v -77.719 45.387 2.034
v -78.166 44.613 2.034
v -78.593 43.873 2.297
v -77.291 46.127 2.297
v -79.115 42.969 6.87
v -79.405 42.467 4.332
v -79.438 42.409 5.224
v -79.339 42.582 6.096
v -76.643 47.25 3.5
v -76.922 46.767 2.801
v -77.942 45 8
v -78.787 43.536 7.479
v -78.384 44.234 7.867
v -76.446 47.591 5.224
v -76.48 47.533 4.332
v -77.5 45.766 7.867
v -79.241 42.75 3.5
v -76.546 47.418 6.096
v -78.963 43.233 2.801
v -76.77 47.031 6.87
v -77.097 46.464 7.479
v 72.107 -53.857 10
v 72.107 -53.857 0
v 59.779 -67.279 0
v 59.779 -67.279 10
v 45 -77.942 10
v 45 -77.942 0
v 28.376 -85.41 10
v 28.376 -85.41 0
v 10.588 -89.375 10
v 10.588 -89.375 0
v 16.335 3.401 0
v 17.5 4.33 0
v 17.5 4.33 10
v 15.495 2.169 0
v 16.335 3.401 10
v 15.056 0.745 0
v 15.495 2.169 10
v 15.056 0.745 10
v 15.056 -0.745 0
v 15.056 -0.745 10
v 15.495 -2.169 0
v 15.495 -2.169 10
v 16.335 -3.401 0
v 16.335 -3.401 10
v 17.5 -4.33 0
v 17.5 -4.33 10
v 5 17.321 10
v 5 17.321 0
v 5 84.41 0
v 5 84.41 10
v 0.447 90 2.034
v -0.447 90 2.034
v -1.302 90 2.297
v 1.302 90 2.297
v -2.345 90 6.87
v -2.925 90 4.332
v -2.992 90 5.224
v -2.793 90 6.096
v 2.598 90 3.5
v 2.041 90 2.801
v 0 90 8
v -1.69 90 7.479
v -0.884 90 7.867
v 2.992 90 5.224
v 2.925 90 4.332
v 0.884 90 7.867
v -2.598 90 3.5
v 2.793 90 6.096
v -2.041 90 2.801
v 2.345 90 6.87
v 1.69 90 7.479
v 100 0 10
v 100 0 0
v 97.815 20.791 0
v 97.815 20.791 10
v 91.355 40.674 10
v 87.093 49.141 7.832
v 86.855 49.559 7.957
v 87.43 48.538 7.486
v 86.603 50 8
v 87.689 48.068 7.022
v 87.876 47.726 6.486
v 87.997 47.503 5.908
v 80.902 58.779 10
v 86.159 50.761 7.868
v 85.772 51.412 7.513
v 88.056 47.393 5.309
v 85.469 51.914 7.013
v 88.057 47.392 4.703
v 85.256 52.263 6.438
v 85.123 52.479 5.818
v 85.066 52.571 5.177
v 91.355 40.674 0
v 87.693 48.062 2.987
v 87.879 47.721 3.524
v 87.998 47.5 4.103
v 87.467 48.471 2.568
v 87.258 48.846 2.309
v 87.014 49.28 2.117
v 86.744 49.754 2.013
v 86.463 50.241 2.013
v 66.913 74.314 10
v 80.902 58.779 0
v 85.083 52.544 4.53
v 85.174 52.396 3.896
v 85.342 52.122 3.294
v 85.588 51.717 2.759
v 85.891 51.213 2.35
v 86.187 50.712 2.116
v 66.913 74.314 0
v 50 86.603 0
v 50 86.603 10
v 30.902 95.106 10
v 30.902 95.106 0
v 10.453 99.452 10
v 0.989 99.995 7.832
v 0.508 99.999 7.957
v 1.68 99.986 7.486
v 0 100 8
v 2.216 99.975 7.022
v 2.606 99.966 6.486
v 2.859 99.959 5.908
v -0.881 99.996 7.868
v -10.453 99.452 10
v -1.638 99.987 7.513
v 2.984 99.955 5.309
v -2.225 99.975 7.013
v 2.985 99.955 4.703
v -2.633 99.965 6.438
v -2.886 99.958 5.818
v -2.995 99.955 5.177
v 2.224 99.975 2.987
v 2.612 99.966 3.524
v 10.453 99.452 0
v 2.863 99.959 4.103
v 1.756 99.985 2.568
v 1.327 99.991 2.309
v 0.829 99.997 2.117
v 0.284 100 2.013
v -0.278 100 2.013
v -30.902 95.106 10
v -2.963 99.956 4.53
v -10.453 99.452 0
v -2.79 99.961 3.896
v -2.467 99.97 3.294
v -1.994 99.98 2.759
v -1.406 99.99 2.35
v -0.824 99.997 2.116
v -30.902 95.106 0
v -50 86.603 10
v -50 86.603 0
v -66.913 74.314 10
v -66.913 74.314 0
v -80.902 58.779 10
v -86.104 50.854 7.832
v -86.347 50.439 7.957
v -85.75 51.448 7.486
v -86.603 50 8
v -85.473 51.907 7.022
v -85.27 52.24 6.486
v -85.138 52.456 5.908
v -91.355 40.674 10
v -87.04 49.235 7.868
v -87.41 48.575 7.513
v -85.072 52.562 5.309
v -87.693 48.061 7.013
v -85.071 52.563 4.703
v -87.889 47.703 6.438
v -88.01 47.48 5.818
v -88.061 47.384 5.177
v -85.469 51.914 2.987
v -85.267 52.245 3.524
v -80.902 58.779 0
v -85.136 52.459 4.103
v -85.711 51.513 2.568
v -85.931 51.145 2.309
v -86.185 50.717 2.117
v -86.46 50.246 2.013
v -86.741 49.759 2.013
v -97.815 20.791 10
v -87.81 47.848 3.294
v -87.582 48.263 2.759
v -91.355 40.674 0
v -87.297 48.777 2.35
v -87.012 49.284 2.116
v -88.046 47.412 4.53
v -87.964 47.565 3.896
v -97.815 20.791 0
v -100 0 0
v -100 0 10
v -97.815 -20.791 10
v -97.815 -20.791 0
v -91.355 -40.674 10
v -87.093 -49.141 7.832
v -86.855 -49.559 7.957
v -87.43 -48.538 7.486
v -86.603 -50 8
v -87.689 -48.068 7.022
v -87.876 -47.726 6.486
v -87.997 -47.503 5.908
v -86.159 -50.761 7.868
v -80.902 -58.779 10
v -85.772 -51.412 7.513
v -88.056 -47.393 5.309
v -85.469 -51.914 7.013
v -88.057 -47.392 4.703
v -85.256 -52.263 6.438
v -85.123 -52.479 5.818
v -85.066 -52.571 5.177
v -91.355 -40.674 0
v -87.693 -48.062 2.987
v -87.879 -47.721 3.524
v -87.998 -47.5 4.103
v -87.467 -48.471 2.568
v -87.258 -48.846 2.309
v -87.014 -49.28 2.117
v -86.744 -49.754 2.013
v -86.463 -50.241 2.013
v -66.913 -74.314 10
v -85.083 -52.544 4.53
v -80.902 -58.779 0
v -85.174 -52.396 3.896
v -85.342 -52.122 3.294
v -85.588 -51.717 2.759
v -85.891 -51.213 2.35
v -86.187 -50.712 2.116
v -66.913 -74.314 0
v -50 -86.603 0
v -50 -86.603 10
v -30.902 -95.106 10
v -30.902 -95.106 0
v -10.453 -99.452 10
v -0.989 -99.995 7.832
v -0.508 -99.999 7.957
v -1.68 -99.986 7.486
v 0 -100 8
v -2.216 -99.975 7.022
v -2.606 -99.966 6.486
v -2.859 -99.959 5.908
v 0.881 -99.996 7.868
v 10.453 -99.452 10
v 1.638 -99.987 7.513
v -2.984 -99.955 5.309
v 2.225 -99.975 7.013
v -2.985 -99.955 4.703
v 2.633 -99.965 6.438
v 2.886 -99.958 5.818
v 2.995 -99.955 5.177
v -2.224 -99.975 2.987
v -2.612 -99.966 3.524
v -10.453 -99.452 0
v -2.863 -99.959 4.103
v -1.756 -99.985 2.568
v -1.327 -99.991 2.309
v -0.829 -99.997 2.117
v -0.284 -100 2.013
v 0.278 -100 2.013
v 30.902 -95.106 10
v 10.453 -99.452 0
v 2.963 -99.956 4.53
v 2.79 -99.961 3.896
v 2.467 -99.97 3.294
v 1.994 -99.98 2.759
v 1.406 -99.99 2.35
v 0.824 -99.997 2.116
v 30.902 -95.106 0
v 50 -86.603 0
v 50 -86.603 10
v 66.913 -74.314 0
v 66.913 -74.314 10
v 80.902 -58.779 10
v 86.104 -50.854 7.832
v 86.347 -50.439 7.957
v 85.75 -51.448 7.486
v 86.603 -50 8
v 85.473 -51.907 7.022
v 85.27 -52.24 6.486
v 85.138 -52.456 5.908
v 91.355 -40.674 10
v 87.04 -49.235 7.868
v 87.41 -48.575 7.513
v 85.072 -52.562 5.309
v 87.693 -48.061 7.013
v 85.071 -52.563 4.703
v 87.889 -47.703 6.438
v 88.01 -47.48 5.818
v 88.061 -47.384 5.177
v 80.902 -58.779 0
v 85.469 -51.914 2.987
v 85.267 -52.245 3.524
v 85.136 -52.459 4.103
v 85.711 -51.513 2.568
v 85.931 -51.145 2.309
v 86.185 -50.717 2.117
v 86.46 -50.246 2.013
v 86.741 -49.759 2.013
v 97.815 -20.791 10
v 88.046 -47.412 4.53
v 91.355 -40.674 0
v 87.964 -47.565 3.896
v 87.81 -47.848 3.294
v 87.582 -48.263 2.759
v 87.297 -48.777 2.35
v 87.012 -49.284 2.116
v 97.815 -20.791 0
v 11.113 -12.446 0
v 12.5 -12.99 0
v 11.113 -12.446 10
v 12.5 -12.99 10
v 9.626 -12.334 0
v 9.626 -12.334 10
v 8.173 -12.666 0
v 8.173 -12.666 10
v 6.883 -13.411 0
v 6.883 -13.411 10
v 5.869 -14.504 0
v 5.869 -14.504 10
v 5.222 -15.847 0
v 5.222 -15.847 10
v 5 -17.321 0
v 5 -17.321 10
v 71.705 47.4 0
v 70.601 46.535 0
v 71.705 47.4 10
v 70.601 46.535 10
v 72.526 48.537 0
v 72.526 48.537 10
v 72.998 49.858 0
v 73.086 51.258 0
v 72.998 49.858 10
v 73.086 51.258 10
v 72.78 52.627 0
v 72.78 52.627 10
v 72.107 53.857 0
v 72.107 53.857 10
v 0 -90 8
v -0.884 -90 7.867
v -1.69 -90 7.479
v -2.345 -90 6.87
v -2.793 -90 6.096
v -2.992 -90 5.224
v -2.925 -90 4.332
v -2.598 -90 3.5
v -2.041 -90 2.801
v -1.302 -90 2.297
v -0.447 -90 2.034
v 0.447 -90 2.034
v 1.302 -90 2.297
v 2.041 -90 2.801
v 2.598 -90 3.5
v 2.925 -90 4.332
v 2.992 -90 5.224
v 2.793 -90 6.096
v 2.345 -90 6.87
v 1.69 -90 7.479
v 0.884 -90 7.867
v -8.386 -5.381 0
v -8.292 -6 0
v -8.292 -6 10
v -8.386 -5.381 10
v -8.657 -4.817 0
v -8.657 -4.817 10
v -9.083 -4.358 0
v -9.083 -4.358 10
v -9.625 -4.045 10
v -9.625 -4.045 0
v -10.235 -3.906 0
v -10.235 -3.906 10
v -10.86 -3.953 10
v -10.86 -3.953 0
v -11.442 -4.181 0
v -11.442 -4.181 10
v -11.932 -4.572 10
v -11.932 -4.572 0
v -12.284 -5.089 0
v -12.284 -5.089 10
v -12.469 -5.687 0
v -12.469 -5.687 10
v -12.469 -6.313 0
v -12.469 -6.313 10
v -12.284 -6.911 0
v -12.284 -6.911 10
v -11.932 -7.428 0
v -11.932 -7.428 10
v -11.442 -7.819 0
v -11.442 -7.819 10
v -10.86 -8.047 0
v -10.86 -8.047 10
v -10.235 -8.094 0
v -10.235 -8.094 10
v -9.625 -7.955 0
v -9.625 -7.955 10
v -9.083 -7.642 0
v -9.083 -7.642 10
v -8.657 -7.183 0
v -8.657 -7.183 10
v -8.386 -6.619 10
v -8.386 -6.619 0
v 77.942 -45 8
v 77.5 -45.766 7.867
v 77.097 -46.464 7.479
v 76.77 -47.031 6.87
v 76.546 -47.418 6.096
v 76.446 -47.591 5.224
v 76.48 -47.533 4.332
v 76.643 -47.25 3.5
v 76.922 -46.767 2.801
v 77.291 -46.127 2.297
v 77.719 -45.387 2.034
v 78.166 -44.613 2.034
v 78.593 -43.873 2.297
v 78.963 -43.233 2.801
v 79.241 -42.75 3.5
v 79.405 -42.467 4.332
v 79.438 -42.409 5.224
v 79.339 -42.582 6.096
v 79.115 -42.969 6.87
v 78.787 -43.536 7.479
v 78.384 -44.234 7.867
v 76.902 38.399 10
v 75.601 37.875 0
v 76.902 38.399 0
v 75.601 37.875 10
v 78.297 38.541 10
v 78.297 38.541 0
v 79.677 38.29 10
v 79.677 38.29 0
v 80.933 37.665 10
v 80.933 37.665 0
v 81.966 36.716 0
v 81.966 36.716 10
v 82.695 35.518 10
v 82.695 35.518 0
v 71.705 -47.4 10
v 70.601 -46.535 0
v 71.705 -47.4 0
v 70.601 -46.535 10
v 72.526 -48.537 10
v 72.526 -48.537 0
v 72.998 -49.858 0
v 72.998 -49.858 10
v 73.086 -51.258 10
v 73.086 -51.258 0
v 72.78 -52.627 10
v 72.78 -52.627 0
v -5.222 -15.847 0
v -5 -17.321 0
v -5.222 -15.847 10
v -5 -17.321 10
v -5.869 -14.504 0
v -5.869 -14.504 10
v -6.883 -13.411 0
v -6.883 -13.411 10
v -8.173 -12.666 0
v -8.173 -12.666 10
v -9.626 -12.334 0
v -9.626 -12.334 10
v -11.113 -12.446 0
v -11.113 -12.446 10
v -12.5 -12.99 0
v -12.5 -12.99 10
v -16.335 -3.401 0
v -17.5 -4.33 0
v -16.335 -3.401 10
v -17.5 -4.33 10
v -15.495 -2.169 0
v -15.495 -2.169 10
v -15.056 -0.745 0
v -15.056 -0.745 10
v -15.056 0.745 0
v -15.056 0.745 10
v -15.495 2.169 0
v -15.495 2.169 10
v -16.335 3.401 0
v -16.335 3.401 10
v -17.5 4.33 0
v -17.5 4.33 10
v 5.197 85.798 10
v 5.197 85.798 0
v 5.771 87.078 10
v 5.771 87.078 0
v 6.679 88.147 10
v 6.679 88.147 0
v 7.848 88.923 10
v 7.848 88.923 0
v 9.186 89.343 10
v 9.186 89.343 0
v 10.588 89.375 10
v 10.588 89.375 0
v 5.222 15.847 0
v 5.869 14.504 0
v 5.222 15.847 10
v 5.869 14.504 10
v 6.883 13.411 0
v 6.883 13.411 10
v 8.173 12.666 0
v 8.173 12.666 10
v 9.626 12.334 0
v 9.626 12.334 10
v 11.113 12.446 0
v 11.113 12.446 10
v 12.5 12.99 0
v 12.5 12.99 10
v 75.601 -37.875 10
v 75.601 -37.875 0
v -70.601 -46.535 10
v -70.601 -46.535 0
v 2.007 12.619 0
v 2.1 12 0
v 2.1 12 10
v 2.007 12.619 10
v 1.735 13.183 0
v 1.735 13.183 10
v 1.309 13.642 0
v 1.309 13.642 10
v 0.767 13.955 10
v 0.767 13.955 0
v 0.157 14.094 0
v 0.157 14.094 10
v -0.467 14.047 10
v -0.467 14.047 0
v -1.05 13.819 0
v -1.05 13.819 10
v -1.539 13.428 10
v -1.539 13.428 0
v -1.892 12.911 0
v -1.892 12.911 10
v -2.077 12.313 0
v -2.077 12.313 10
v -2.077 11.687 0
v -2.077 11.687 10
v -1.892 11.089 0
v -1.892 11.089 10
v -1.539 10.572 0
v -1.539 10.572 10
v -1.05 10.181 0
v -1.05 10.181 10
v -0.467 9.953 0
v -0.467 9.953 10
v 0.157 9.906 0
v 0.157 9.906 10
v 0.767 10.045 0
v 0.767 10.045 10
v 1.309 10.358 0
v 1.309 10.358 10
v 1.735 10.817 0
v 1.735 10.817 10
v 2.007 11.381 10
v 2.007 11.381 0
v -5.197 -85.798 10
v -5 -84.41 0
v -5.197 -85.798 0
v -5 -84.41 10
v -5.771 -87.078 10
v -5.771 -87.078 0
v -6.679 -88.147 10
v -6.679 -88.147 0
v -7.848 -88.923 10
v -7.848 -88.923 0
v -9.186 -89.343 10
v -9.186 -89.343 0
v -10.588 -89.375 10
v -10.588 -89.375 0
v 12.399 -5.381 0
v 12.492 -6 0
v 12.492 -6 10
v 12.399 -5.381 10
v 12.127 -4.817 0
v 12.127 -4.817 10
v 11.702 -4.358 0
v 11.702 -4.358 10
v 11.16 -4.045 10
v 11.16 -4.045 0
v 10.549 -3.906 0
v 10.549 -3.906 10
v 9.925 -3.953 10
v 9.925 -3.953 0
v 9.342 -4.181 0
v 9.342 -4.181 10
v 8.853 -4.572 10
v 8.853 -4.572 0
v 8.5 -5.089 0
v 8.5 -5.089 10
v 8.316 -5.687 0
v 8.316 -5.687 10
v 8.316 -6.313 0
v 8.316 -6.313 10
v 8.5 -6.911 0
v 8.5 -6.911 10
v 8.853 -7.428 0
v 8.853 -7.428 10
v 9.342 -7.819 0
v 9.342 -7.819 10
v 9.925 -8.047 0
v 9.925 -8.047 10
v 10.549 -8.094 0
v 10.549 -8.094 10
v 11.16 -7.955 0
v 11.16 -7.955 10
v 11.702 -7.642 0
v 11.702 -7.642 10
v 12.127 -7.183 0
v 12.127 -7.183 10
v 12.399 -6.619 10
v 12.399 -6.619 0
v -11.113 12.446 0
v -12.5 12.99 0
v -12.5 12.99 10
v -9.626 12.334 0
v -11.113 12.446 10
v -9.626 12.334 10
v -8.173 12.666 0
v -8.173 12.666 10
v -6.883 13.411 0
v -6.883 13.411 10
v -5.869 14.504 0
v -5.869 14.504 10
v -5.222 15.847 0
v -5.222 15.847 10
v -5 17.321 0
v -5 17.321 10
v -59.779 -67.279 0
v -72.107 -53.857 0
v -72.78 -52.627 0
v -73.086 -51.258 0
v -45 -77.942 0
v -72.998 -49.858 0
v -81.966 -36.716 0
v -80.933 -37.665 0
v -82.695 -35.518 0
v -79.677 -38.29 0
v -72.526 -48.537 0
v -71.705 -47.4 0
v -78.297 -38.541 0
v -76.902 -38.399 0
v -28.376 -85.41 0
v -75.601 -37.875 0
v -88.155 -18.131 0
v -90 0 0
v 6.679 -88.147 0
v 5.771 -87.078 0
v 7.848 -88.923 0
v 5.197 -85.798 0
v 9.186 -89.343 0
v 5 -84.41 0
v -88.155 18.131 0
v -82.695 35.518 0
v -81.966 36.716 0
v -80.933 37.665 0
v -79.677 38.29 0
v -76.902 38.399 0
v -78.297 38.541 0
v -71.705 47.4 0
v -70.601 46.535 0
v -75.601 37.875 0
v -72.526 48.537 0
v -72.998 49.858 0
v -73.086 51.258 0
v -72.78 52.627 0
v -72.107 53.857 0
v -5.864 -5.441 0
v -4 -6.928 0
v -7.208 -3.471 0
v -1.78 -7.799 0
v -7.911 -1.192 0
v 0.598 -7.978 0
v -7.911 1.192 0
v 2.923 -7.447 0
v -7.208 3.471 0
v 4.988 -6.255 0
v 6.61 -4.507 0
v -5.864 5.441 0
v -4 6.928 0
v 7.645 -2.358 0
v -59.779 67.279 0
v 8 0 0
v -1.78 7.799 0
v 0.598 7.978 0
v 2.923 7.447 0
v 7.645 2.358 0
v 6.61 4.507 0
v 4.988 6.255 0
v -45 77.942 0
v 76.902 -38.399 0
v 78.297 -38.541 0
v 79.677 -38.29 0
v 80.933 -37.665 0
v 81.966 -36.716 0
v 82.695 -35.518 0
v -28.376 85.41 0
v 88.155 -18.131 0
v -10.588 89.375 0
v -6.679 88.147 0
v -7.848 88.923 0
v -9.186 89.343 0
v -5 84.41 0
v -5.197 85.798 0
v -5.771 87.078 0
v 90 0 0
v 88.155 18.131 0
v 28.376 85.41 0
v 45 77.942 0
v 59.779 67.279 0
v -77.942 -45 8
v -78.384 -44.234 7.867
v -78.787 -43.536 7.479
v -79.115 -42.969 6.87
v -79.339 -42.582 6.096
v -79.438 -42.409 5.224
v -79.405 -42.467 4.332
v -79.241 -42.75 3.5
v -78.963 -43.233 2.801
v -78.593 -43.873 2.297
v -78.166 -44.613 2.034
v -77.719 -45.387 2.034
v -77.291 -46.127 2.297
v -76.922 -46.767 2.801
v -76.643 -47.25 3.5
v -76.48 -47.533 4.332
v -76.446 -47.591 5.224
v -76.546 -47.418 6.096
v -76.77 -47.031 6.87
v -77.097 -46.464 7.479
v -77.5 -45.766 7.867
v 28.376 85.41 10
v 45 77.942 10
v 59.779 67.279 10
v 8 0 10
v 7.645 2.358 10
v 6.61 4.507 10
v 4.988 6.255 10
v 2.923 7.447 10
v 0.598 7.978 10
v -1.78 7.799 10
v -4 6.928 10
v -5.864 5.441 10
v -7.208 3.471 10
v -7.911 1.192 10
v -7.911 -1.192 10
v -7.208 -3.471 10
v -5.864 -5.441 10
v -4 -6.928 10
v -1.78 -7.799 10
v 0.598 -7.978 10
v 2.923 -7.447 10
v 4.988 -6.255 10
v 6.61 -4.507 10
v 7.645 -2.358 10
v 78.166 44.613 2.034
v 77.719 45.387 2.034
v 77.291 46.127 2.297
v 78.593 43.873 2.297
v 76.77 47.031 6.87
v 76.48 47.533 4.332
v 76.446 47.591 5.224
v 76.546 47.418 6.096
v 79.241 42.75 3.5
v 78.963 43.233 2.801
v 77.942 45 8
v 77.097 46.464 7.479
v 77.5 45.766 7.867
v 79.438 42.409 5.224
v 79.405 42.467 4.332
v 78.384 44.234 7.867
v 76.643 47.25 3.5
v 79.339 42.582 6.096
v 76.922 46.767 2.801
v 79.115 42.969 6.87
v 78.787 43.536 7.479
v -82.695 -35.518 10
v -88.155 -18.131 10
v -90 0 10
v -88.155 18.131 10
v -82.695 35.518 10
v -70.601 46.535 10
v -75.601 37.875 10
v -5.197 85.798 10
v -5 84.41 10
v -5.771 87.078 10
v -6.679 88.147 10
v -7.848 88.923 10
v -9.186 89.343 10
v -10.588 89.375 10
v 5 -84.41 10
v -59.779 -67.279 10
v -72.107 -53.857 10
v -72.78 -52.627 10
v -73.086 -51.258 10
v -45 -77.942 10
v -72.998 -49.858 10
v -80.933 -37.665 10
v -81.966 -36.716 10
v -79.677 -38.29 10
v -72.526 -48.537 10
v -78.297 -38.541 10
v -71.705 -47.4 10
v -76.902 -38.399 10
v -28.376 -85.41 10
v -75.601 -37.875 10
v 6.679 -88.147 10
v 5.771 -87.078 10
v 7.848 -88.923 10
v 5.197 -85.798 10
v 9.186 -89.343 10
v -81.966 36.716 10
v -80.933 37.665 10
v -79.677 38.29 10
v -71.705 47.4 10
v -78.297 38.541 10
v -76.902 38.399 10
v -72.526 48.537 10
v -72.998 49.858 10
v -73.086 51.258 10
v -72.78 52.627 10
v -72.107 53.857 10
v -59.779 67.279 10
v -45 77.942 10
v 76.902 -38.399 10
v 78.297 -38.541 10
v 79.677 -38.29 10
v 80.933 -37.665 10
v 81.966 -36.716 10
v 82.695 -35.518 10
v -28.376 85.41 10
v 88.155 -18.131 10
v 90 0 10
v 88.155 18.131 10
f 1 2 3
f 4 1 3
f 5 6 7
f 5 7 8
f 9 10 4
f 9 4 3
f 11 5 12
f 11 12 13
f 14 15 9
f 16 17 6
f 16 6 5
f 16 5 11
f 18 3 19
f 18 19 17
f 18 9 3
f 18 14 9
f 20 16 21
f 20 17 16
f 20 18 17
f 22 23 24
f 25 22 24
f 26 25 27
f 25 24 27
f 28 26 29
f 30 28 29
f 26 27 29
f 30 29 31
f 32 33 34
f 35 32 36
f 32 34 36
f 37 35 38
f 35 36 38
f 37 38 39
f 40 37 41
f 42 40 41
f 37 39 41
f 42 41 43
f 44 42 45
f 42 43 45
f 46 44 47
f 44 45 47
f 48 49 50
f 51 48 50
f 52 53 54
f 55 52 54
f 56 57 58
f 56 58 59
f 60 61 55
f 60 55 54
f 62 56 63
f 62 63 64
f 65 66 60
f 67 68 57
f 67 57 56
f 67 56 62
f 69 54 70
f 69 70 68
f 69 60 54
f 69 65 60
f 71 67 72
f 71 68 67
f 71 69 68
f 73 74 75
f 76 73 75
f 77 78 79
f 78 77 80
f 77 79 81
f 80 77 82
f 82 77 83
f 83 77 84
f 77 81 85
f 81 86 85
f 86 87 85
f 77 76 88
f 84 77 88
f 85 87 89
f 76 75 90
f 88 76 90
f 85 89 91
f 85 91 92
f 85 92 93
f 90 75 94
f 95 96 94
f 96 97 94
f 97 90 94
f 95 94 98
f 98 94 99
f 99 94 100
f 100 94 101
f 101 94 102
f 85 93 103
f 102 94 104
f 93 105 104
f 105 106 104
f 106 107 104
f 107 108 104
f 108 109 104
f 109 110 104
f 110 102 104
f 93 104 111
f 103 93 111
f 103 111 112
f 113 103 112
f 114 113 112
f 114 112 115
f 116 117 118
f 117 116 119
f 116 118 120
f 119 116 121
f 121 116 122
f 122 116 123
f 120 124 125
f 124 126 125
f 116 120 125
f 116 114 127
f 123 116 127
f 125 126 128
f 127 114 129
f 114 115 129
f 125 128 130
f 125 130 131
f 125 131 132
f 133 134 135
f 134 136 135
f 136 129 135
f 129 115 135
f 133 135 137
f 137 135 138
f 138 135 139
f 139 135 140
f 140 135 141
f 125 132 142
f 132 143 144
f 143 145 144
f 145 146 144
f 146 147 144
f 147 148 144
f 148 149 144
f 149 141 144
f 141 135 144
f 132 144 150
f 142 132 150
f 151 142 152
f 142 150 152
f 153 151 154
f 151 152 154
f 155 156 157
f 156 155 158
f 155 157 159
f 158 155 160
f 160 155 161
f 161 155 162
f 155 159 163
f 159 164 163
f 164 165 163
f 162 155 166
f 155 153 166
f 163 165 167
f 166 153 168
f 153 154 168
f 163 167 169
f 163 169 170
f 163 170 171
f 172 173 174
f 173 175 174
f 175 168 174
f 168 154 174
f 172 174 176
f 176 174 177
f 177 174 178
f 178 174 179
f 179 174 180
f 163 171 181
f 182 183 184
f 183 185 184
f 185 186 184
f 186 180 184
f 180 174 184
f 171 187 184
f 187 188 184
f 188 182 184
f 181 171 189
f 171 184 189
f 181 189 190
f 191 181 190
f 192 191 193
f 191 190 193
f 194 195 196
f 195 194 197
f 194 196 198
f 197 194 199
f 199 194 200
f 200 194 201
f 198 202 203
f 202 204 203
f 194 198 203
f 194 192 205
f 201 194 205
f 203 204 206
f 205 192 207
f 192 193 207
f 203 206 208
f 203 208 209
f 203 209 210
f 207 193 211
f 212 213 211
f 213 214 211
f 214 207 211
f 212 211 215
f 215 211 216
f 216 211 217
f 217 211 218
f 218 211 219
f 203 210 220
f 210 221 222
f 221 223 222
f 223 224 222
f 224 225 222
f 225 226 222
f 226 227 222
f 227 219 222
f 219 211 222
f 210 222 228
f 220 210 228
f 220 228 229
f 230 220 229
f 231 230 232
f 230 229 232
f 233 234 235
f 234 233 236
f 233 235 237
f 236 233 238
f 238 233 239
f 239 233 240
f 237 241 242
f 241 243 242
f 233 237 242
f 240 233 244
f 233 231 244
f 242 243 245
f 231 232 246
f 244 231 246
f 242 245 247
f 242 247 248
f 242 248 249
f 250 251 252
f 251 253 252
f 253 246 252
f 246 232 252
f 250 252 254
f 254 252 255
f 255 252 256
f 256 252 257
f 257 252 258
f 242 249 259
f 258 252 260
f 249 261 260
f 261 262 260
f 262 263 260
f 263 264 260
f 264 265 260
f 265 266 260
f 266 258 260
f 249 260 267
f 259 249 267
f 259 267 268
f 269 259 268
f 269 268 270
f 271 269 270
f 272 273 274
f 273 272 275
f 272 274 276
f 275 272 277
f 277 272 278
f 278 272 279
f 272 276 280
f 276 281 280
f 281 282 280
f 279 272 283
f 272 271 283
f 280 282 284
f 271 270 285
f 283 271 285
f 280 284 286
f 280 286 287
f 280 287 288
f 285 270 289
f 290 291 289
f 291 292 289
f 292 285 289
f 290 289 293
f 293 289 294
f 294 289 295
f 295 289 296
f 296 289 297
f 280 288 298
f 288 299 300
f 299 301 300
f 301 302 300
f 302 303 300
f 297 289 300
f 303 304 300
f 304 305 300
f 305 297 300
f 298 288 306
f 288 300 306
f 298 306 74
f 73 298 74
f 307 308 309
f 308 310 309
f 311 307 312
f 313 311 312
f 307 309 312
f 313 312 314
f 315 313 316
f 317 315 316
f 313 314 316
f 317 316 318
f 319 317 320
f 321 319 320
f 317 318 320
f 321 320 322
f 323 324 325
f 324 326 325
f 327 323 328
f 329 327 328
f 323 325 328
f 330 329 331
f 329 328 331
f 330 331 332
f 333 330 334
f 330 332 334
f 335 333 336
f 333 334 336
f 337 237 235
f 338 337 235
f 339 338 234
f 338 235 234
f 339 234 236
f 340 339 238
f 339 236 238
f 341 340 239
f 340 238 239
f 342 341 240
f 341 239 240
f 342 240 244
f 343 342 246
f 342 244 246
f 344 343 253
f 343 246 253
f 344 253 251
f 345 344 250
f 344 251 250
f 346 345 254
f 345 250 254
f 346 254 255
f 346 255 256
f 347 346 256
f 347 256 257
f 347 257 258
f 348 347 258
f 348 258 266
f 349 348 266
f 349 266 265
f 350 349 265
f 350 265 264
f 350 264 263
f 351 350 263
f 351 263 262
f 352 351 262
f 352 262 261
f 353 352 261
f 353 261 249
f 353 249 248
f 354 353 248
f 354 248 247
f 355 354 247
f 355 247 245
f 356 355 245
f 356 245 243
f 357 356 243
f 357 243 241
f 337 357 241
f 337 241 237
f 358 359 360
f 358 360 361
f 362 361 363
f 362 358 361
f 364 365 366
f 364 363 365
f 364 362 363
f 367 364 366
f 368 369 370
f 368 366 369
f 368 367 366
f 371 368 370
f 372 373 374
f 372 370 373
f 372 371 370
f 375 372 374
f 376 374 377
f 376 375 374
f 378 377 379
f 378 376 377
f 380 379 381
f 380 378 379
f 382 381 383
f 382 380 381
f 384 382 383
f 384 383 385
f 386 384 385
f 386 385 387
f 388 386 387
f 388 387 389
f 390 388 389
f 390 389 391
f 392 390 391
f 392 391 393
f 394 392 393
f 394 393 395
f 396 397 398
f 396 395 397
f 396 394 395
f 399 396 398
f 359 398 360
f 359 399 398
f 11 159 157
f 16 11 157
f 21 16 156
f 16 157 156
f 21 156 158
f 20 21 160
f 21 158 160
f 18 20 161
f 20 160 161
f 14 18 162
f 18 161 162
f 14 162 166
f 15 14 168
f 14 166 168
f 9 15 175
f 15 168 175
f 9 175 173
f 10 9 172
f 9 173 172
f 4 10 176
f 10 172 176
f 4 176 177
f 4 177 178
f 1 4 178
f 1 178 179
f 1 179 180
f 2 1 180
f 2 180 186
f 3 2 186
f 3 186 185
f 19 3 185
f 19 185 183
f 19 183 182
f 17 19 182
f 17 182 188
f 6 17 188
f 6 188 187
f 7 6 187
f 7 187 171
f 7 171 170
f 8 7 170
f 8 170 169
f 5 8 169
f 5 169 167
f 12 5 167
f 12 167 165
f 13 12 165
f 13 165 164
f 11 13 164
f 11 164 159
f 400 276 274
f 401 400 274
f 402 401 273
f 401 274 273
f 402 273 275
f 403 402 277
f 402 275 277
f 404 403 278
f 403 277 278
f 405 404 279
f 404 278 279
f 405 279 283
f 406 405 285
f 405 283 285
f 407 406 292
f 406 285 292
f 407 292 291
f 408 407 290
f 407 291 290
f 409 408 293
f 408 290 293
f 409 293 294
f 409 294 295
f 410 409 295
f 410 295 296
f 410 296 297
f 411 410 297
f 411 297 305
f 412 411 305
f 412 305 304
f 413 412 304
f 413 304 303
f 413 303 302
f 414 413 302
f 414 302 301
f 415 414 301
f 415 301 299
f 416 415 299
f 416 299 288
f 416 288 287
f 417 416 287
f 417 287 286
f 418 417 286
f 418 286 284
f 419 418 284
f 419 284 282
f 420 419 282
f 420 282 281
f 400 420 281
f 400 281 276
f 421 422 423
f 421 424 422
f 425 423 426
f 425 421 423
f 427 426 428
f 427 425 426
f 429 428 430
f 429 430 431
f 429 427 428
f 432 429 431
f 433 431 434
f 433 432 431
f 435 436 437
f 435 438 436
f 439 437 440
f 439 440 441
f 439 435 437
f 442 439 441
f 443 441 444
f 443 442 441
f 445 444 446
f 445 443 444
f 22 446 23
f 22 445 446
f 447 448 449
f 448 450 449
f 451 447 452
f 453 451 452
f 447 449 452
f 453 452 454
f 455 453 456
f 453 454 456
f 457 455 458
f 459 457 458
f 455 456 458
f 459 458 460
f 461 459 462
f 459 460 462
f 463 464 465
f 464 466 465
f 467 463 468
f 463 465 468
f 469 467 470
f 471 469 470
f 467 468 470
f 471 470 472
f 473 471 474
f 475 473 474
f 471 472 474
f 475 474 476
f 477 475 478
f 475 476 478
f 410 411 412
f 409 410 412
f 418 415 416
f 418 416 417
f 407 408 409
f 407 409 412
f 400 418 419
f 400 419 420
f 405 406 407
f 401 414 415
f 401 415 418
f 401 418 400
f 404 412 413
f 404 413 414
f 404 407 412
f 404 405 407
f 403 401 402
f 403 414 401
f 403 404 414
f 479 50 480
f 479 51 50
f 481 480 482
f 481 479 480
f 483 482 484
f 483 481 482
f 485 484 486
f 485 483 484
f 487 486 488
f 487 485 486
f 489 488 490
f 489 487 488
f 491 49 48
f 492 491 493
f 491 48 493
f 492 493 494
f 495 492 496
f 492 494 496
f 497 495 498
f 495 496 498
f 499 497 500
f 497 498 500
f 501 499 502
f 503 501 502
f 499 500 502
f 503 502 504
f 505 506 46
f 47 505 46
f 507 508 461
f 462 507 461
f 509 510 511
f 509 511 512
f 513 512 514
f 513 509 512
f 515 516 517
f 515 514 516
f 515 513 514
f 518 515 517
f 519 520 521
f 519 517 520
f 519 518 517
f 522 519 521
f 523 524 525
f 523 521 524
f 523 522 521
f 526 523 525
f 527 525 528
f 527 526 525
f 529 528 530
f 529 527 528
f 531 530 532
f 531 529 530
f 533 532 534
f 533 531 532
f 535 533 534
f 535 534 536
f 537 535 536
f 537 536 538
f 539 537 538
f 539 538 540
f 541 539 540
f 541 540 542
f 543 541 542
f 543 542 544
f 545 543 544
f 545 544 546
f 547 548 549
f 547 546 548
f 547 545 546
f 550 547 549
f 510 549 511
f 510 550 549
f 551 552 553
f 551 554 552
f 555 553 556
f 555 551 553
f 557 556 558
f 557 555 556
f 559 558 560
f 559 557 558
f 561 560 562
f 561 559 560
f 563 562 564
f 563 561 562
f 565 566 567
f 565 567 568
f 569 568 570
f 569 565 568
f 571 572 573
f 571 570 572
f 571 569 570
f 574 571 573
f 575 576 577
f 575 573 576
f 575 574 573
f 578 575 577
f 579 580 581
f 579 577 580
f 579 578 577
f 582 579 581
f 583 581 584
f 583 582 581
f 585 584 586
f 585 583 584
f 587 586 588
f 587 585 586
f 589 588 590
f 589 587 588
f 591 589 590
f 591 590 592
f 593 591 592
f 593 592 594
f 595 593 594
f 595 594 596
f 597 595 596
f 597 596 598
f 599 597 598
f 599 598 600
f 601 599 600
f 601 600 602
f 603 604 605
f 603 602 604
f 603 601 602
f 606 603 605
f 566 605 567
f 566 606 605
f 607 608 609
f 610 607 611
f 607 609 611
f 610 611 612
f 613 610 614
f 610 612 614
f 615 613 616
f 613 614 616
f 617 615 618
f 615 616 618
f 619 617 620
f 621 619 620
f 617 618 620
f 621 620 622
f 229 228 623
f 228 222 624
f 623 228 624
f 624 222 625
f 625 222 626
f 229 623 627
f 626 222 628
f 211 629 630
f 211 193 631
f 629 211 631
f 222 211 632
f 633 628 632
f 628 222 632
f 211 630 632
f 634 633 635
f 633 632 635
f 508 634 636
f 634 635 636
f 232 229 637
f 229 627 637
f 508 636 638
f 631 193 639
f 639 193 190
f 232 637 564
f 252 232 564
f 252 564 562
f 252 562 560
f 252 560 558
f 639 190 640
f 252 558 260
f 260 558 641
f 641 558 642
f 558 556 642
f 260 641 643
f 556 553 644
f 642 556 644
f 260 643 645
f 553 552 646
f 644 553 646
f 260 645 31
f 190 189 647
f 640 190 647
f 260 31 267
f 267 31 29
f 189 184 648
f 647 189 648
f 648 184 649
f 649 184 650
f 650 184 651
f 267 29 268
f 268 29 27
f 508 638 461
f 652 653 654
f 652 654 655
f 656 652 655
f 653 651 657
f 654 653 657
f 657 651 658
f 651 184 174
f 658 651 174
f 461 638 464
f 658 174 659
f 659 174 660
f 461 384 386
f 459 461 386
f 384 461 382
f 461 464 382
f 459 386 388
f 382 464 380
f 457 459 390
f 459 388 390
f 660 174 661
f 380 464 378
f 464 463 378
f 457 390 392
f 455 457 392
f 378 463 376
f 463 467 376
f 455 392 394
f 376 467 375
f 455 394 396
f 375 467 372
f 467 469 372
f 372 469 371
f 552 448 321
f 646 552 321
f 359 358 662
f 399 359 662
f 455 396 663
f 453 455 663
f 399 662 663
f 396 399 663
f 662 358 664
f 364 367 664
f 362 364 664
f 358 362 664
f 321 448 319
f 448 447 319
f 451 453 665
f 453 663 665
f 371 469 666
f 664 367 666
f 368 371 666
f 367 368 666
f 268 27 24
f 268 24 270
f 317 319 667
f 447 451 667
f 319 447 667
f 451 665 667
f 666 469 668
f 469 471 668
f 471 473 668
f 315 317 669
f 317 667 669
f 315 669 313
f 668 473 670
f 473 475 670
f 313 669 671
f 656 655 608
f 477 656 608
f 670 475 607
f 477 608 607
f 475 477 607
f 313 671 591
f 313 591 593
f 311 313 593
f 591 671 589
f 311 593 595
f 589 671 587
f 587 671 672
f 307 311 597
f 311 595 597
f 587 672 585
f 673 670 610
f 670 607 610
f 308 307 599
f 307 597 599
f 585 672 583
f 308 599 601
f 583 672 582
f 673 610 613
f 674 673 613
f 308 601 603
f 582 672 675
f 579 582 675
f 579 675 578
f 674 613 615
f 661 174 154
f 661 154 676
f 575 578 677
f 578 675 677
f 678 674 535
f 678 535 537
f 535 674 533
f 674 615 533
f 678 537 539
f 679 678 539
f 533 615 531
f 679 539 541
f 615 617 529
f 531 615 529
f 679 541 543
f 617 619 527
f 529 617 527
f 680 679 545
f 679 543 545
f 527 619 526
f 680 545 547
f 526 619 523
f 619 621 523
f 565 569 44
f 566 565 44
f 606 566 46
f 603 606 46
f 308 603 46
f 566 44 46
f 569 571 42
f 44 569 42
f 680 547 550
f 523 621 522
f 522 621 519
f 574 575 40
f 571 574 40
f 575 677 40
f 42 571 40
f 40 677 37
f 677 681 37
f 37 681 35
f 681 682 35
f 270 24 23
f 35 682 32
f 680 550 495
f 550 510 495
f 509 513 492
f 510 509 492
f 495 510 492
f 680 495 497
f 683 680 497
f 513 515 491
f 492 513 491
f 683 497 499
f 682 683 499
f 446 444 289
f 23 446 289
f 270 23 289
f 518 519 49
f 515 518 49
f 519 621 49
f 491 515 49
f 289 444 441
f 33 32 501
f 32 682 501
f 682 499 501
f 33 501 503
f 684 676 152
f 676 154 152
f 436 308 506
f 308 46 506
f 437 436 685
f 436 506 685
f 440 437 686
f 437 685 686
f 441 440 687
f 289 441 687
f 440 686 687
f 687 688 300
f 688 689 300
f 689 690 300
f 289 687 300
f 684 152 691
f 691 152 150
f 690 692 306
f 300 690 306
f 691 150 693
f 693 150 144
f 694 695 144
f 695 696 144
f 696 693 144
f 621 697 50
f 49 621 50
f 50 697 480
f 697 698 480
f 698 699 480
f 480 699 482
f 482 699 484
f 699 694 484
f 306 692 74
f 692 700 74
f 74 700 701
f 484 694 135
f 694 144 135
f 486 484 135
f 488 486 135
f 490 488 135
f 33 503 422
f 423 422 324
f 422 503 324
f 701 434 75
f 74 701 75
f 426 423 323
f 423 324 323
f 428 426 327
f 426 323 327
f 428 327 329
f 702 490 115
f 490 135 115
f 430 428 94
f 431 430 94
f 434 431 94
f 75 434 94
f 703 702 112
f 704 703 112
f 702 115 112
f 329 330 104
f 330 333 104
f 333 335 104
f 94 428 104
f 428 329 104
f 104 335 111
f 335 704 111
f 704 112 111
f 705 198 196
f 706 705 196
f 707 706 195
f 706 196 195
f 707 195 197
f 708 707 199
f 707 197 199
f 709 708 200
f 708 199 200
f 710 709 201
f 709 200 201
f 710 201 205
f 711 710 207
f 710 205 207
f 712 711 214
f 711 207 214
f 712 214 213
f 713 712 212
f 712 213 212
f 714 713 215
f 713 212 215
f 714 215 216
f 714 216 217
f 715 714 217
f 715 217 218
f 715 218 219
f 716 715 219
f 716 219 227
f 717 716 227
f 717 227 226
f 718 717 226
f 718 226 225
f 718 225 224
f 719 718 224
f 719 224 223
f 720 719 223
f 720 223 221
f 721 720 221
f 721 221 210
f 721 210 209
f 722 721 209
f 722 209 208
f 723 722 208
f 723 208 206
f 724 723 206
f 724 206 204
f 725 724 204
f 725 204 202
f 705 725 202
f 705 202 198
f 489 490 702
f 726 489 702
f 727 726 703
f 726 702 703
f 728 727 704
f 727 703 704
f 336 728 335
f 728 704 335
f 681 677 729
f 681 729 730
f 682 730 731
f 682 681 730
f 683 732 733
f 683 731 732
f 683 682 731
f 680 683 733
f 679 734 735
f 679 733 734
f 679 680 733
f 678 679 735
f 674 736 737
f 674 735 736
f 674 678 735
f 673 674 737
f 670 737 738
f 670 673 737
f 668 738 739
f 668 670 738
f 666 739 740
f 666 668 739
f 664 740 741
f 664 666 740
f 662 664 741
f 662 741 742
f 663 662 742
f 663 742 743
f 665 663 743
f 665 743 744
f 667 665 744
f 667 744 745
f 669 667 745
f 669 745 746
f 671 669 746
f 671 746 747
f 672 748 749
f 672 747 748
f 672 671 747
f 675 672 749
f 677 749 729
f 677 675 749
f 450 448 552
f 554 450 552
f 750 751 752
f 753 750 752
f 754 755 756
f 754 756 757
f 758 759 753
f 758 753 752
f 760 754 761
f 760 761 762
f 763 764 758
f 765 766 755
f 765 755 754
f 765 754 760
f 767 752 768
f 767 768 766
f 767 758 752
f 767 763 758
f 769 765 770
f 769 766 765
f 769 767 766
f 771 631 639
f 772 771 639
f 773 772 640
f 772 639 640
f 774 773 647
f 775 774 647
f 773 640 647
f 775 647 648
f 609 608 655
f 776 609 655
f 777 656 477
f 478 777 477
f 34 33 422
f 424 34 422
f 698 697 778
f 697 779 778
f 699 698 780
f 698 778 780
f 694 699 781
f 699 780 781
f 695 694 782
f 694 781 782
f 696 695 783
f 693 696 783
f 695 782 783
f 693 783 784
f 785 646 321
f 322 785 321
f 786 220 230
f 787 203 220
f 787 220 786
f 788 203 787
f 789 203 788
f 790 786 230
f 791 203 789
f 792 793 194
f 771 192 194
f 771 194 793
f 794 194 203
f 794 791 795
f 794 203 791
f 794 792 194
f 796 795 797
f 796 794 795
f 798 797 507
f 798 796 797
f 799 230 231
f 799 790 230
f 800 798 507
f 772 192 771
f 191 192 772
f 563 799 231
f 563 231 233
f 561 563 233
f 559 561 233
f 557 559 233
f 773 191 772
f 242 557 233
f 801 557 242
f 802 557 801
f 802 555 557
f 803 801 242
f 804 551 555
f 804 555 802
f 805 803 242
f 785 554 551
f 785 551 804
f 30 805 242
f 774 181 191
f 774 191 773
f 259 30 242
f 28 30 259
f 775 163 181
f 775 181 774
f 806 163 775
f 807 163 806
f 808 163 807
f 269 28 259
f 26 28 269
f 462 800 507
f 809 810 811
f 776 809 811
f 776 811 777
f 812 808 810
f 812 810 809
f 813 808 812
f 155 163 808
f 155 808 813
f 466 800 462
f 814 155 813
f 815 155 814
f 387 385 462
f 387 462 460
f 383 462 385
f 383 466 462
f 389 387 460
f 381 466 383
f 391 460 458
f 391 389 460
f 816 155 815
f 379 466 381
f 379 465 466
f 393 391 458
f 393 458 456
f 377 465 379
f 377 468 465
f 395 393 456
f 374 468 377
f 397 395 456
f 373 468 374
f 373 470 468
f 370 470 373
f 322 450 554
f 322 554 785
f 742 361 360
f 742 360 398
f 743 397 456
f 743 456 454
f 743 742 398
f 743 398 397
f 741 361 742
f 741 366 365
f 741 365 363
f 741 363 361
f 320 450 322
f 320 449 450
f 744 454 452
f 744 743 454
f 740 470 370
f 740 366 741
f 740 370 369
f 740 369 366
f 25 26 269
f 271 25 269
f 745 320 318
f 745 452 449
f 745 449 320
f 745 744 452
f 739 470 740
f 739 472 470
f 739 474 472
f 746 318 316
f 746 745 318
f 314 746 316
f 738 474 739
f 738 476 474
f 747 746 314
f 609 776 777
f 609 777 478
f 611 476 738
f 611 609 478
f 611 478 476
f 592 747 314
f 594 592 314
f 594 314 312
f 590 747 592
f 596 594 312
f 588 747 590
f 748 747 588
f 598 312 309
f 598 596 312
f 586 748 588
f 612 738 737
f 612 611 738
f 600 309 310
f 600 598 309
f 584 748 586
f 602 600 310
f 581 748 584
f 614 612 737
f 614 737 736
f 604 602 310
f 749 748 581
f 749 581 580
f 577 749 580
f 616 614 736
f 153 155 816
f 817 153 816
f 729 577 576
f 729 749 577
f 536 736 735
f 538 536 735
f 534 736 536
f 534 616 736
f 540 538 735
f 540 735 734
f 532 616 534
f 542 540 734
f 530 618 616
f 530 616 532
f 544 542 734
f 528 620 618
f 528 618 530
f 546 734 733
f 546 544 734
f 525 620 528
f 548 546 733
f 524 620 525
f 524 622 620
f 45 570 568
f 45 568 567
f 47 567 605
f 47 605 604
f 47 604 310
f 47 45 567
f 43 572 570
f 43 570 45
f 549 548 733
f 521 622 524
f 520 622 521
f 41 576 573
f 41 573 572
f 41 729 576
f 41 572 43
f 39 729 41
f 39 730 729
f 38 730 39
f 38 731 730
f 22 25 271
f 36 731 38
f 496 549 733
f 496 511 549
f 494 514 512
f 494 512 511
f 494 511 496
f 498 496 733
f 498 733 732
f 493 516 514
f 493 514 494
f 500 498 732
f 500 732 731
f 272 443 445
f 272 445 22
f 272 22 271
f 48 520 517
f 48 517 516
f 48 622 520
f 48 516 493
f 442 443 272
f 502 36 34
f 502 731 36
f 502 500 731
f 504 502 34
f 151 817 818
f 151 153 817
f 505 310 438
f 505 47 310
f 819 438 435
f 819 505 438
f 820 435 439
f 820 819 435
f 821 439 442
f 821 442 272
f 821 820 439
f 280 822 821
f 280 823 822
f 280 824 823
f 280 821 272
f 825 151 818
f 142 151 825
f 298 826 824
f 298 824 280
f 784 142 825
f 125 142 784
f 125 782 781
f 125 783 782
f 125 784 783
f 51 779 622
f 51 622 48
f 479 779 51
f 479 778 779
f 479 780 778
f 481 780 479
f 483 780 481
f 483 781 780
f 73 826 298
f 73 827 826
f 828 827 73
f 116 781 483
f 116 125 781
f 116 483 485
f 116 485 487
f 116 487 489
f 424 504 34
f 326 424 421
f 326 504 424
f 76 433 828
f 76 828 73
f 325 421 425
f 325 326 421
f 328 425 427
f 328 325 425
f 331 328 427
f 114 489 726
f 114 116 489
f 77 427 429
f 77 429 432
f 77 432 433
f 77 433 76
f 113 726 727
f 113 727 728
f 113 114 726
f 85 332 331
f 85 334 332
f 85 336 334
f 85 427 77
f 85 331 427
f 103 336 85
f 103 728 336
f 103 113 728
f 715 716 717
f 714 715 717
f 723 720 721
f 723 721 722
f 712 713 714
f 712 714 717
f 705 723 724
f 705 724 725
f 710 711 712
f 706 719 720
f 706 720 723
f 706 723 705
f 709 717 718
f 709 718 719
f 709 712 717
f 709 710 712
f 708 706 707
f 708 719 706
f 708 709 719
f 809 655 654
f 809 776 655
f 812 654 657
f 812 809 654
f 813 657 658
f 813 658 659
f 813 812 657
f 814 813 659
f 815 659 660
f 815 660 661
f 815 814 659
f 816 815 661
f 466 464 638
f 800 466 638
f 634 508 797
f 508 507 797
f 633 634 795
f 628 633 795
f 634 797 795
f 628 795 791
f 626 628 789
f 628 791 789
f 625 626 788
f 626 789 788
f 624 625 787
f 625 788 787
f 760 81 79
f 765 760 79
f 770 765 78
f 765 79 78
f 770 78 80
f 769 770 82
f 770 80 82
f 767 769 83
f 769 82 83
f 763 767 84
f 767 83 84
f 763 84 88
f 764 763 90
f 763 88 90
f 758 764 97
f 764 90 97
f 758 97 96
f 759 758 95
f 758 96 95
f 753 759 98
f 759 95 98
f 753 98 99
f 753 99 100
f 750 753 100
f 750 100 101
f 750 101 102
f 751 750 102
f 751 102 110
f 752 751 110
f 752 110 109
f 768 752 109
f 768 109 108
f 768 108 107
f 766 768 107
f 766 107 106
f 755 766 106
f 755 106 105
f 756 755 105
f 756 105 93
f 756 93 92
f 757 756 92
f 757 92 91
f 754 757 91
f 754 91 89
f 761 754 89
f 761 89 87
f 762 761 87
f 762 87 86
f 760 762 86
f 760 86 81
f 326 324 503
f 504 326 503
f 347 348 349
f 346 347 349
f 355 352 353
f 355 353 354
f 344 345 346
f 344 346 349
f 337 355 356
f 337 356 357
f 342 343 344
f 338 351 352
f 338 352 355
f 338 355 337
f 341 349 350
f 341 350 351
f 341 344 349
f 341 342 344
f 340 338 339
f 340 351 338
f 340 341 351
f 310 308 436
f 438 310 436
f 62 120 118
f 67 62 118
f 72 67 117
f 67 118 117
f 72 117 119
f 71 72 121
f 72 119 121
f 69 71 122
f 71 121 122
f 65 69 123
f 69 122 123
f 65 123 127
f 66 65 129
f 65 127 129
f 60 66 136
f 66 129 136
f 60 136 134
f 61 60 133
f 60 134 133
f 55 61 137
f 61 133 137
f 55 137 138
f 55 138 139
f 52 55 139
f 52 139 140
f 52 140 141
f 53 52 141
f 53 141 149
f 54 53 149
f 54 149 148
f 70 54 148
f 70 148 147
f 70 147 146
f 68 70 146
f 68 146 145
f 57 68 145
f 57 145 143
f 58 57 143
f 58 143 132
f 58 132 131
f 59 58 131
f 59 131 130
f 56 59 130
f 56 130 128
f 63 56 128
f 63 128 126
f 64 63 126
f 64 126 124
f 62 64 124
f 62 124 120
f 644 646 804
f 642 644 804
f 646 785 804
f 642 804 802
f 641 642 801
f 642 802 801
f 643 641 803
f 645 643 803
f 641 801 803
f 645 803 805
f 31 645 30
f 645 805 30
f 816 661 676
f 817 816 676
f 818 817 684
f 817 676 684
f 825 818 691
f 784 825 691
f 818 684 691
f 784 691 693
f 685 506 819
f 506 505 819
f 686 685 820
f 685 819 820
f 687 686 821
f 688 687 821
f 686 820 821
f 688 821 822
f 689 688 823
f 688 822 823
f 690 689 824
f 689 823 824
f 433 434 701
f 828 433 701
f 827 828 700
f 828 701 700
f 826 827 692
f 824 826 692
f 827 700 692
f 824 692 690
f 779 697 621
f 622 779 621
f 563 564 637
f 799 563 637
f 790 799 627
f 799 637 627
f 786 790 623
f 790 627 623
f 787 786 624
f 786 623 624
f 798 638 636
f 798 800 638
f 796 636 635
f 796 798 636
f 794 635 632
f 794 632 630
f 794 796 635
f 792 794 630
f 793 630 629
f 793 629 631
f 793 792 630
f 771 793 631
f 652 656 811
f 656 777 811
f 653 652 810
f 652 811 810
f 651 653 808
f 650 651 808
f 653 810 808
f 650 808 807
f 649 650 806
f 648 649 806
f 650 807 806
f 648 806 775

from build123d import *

# Parameters (mm, degrees)
ESQUISSE1_R                  = 100
BOSS_EXTRU_1_DEPTH           = 10
ENL_V_MAT_EXTRU_1_DEPTH      = 142.774468788
ENL_V_MAT_EXTRU_1_DEPTH_BACK = 142.774468788
CONG_1_R                     = 5
ENL_V_MAT_EXTRU_2_DEPTH      = 142.774468788
ENL_V_MAT_EXTRU_2_DEPTH_BACK = 142.774468788
ESQUISSE3_R                  = 8
ENL_V_MAT_EXTRU_3_DEPTH      = 142.774468788
ENL_V_MAT_EXTRU_3_DEPTH_BACK = 142.774468788
ESQUISSE4_R                  = 2.1
ENL_V_START                  = 100
ESQUISSE5_R                  = 3
ENL_V_MAT_EXTRU_4_DEPTH      = 10
R_P_TITION_CIRCULAIRE1_COUNT = 6


with BuildPart() as part:
    # Esquisse1 → Boss.-Extru.1 (new body)
    with BuildSketch(Plane.XY):
        Circle(ESQUISSE1_R)
    extrude(amount=BOSS_EXTRU_1_DEPTH)

    # Esquisse2 → Enlèv. mat.-Extru.1 (cut, two sides: drawn at the far end of the back side and taken through both)
    with BuildSketch(Plane.XY.offset(10).offset(-ENL_V_MAT_EXTRU_1_DEPTH_BACK)):
        with BuildLine():
            Line((10, 0), (80.321912081, 40.60037487))
            ThreePointArc((80.321912081, 40.60037487), (90, 0), (80.321912081, -40.60037487))
            Line((80.321912081, -40.60037487), (10, 0))
        make_face()
        with BuildLine():
            Line((5, -8.660254038), (75.321912081, -49.260628908))
            ThreePointArc((75.321912081, -49.260628908), (45, -77.942286341), (5, -89.861003778))
            Line((5, -89.861003778), (5, -8.660254038))
        make_face()
        with BuildLine():
            Line((-5, -8.660254038), (-5, -89.861003778))
            ThreePointArc((-5, -89.861003778), (-45, -77.942286341), (-75.321912081, -49.260628908))
            Line((-75.321912081, -49.260628908), (-5, -8.660254038))
        make_face()
        with BuildLine():
            Line((-10, 0), (-80.321912081, -40.60037487))
            ThreePointArc((-80.321912081, -40.60037487), (-90, 0), (-80.321912081, 40.60037487))
            Line((-80.321912081, 40.60037487), (-10, 0))
        make_face()
        with BuildLine():
            Line((-5, 8.660254038), (-75.321912081, 49.260628908))
            ThreePointArc((-75.321912081, 49.260628908), (-45, 77.942286341), (-5, 89.861003778))
            Line((-5, 89.861003778), (-5, 8.660254038))
        make_face()
        with BuildLine():
            Line((5, 8.660254038), (5, 89.861003778))
            ThreePointArc((5, 89.861003778), (45, 77.942286341), (75.321912081, 49.260628908))
            Line((75.321912081, 49.260628908), (5, 8.660254038))
        make_face()
    extrude(amount=ENL_V_MAT_EXTRU_1_DEPTH + ENL_V_MAT_EXTRU_1_DEPTH_BACK, mode=Mode.SUBTRACT)

    # Congé1
    cong_1_edges = [part.edges().sort_by_distance(p)[0] for p in [
        (80.321912081, -40.60037487, 5),
        (10, 0, 5),
        (80.321912081, 40.60037487, 5),
        (-80.321912081, 40.60037487, 5),
        (-10, 0, 5),
        (-80.321912081, -40.60037487, 5),
        (-5, 89.861003778, 5),
        (-5, 8.660254038, 5),
        (-75.321912081, 49.260628908, 5),
        (75.321912081, 49.260628908, 5),
        (5, 8.660254038, 5),
        (5, 89.861003778, 5),
        (-75.321912081, -49.260628908, 5),
        (-5, -8.660254038, 5),
        (-5, -89.861003778, 5),
        (5, -89.861003778, 5),
        (5, -8.660254038, 5),
        (75.321912081, -49.260628908, 5),
    ]]
    fillet(cong_1_edges, radius=CONG_1_R)

    # Esquisse3 → Enlèv. mat.-Extru.2 (cut, two sides: drawn at the far end of the back side and taken through both)
    with BuildSketch(Plane.XY.offset(10).offset(-ENL_V_MAT_EXTRU_2_DEPTH_BACK)):
        Circle(ESQUISSE3_R)
    extrude(amount=ENL_V_MAT_EXTRU_2_DEPTH + ENL_V_MAT_EXTRU_2_DEPTH_BACK, mode=Mode.SUBTRACT)

    # Esquisse4 → Enlèv. mat.-Extru.3 (cut, two sides: drawn at the far end of the back side and taken through both)
    with BuildSketch(Plane.XY.offset(10).offset(-ENL_V_MAT_EXTRU_3_DEPTH_BACK)):
        with Locations((0, 12)):
            Circle(ESQUISSE4_R)
        with Locations((10.392304845, -6)):
            Circle(ESQUISSE4_R)
        with Locations((-10.392304845, -6)):
            Circle(ESQUISSE4_R)
    extrude(amount=ENL_V_MAT_EXTRU_3_DEPTH + ENL_V_MAT_EXTRU_3_DEPTH_BACK, mode=Mode.SUBTRACT)

    # Esquisse5 → Enlèv. mat.-Extru.4 (cut)
    with BuildSketch(Plane(origin=(0, 0, 0), x_dir=(0, 0, -1), z_dir=(0, 1, 0)).offset(ENL_V_START)):
        with Locations(Location((-5, 0, 0), (0, 0, 180))):
            Circle(ESQUISSE5_R)
    enl_v_mat_extru_4 = extrude(amount=-ENL_V_MAT_EXTRU_4_DEPTH, mode=Mode.SUBTRACT)

    # Répétition circulaire1: Enlèv. mat.-Extru.4 ×6 about axis
    r_p_tition_circulaire1_axis = Axis((0, 0, 0), (0, 0, 1))
    for i in range(1, R_P_TITION_CIRCULAIRE1_COUNT):
        add(enl_v_mat_extru_4.rotate(r_p_tition_circulaire1_axis, i * 360 / R_P_TITION_CIRCULAIRE1_COUNT), mode=Mode.SUBTRACT)


solid = part.part
